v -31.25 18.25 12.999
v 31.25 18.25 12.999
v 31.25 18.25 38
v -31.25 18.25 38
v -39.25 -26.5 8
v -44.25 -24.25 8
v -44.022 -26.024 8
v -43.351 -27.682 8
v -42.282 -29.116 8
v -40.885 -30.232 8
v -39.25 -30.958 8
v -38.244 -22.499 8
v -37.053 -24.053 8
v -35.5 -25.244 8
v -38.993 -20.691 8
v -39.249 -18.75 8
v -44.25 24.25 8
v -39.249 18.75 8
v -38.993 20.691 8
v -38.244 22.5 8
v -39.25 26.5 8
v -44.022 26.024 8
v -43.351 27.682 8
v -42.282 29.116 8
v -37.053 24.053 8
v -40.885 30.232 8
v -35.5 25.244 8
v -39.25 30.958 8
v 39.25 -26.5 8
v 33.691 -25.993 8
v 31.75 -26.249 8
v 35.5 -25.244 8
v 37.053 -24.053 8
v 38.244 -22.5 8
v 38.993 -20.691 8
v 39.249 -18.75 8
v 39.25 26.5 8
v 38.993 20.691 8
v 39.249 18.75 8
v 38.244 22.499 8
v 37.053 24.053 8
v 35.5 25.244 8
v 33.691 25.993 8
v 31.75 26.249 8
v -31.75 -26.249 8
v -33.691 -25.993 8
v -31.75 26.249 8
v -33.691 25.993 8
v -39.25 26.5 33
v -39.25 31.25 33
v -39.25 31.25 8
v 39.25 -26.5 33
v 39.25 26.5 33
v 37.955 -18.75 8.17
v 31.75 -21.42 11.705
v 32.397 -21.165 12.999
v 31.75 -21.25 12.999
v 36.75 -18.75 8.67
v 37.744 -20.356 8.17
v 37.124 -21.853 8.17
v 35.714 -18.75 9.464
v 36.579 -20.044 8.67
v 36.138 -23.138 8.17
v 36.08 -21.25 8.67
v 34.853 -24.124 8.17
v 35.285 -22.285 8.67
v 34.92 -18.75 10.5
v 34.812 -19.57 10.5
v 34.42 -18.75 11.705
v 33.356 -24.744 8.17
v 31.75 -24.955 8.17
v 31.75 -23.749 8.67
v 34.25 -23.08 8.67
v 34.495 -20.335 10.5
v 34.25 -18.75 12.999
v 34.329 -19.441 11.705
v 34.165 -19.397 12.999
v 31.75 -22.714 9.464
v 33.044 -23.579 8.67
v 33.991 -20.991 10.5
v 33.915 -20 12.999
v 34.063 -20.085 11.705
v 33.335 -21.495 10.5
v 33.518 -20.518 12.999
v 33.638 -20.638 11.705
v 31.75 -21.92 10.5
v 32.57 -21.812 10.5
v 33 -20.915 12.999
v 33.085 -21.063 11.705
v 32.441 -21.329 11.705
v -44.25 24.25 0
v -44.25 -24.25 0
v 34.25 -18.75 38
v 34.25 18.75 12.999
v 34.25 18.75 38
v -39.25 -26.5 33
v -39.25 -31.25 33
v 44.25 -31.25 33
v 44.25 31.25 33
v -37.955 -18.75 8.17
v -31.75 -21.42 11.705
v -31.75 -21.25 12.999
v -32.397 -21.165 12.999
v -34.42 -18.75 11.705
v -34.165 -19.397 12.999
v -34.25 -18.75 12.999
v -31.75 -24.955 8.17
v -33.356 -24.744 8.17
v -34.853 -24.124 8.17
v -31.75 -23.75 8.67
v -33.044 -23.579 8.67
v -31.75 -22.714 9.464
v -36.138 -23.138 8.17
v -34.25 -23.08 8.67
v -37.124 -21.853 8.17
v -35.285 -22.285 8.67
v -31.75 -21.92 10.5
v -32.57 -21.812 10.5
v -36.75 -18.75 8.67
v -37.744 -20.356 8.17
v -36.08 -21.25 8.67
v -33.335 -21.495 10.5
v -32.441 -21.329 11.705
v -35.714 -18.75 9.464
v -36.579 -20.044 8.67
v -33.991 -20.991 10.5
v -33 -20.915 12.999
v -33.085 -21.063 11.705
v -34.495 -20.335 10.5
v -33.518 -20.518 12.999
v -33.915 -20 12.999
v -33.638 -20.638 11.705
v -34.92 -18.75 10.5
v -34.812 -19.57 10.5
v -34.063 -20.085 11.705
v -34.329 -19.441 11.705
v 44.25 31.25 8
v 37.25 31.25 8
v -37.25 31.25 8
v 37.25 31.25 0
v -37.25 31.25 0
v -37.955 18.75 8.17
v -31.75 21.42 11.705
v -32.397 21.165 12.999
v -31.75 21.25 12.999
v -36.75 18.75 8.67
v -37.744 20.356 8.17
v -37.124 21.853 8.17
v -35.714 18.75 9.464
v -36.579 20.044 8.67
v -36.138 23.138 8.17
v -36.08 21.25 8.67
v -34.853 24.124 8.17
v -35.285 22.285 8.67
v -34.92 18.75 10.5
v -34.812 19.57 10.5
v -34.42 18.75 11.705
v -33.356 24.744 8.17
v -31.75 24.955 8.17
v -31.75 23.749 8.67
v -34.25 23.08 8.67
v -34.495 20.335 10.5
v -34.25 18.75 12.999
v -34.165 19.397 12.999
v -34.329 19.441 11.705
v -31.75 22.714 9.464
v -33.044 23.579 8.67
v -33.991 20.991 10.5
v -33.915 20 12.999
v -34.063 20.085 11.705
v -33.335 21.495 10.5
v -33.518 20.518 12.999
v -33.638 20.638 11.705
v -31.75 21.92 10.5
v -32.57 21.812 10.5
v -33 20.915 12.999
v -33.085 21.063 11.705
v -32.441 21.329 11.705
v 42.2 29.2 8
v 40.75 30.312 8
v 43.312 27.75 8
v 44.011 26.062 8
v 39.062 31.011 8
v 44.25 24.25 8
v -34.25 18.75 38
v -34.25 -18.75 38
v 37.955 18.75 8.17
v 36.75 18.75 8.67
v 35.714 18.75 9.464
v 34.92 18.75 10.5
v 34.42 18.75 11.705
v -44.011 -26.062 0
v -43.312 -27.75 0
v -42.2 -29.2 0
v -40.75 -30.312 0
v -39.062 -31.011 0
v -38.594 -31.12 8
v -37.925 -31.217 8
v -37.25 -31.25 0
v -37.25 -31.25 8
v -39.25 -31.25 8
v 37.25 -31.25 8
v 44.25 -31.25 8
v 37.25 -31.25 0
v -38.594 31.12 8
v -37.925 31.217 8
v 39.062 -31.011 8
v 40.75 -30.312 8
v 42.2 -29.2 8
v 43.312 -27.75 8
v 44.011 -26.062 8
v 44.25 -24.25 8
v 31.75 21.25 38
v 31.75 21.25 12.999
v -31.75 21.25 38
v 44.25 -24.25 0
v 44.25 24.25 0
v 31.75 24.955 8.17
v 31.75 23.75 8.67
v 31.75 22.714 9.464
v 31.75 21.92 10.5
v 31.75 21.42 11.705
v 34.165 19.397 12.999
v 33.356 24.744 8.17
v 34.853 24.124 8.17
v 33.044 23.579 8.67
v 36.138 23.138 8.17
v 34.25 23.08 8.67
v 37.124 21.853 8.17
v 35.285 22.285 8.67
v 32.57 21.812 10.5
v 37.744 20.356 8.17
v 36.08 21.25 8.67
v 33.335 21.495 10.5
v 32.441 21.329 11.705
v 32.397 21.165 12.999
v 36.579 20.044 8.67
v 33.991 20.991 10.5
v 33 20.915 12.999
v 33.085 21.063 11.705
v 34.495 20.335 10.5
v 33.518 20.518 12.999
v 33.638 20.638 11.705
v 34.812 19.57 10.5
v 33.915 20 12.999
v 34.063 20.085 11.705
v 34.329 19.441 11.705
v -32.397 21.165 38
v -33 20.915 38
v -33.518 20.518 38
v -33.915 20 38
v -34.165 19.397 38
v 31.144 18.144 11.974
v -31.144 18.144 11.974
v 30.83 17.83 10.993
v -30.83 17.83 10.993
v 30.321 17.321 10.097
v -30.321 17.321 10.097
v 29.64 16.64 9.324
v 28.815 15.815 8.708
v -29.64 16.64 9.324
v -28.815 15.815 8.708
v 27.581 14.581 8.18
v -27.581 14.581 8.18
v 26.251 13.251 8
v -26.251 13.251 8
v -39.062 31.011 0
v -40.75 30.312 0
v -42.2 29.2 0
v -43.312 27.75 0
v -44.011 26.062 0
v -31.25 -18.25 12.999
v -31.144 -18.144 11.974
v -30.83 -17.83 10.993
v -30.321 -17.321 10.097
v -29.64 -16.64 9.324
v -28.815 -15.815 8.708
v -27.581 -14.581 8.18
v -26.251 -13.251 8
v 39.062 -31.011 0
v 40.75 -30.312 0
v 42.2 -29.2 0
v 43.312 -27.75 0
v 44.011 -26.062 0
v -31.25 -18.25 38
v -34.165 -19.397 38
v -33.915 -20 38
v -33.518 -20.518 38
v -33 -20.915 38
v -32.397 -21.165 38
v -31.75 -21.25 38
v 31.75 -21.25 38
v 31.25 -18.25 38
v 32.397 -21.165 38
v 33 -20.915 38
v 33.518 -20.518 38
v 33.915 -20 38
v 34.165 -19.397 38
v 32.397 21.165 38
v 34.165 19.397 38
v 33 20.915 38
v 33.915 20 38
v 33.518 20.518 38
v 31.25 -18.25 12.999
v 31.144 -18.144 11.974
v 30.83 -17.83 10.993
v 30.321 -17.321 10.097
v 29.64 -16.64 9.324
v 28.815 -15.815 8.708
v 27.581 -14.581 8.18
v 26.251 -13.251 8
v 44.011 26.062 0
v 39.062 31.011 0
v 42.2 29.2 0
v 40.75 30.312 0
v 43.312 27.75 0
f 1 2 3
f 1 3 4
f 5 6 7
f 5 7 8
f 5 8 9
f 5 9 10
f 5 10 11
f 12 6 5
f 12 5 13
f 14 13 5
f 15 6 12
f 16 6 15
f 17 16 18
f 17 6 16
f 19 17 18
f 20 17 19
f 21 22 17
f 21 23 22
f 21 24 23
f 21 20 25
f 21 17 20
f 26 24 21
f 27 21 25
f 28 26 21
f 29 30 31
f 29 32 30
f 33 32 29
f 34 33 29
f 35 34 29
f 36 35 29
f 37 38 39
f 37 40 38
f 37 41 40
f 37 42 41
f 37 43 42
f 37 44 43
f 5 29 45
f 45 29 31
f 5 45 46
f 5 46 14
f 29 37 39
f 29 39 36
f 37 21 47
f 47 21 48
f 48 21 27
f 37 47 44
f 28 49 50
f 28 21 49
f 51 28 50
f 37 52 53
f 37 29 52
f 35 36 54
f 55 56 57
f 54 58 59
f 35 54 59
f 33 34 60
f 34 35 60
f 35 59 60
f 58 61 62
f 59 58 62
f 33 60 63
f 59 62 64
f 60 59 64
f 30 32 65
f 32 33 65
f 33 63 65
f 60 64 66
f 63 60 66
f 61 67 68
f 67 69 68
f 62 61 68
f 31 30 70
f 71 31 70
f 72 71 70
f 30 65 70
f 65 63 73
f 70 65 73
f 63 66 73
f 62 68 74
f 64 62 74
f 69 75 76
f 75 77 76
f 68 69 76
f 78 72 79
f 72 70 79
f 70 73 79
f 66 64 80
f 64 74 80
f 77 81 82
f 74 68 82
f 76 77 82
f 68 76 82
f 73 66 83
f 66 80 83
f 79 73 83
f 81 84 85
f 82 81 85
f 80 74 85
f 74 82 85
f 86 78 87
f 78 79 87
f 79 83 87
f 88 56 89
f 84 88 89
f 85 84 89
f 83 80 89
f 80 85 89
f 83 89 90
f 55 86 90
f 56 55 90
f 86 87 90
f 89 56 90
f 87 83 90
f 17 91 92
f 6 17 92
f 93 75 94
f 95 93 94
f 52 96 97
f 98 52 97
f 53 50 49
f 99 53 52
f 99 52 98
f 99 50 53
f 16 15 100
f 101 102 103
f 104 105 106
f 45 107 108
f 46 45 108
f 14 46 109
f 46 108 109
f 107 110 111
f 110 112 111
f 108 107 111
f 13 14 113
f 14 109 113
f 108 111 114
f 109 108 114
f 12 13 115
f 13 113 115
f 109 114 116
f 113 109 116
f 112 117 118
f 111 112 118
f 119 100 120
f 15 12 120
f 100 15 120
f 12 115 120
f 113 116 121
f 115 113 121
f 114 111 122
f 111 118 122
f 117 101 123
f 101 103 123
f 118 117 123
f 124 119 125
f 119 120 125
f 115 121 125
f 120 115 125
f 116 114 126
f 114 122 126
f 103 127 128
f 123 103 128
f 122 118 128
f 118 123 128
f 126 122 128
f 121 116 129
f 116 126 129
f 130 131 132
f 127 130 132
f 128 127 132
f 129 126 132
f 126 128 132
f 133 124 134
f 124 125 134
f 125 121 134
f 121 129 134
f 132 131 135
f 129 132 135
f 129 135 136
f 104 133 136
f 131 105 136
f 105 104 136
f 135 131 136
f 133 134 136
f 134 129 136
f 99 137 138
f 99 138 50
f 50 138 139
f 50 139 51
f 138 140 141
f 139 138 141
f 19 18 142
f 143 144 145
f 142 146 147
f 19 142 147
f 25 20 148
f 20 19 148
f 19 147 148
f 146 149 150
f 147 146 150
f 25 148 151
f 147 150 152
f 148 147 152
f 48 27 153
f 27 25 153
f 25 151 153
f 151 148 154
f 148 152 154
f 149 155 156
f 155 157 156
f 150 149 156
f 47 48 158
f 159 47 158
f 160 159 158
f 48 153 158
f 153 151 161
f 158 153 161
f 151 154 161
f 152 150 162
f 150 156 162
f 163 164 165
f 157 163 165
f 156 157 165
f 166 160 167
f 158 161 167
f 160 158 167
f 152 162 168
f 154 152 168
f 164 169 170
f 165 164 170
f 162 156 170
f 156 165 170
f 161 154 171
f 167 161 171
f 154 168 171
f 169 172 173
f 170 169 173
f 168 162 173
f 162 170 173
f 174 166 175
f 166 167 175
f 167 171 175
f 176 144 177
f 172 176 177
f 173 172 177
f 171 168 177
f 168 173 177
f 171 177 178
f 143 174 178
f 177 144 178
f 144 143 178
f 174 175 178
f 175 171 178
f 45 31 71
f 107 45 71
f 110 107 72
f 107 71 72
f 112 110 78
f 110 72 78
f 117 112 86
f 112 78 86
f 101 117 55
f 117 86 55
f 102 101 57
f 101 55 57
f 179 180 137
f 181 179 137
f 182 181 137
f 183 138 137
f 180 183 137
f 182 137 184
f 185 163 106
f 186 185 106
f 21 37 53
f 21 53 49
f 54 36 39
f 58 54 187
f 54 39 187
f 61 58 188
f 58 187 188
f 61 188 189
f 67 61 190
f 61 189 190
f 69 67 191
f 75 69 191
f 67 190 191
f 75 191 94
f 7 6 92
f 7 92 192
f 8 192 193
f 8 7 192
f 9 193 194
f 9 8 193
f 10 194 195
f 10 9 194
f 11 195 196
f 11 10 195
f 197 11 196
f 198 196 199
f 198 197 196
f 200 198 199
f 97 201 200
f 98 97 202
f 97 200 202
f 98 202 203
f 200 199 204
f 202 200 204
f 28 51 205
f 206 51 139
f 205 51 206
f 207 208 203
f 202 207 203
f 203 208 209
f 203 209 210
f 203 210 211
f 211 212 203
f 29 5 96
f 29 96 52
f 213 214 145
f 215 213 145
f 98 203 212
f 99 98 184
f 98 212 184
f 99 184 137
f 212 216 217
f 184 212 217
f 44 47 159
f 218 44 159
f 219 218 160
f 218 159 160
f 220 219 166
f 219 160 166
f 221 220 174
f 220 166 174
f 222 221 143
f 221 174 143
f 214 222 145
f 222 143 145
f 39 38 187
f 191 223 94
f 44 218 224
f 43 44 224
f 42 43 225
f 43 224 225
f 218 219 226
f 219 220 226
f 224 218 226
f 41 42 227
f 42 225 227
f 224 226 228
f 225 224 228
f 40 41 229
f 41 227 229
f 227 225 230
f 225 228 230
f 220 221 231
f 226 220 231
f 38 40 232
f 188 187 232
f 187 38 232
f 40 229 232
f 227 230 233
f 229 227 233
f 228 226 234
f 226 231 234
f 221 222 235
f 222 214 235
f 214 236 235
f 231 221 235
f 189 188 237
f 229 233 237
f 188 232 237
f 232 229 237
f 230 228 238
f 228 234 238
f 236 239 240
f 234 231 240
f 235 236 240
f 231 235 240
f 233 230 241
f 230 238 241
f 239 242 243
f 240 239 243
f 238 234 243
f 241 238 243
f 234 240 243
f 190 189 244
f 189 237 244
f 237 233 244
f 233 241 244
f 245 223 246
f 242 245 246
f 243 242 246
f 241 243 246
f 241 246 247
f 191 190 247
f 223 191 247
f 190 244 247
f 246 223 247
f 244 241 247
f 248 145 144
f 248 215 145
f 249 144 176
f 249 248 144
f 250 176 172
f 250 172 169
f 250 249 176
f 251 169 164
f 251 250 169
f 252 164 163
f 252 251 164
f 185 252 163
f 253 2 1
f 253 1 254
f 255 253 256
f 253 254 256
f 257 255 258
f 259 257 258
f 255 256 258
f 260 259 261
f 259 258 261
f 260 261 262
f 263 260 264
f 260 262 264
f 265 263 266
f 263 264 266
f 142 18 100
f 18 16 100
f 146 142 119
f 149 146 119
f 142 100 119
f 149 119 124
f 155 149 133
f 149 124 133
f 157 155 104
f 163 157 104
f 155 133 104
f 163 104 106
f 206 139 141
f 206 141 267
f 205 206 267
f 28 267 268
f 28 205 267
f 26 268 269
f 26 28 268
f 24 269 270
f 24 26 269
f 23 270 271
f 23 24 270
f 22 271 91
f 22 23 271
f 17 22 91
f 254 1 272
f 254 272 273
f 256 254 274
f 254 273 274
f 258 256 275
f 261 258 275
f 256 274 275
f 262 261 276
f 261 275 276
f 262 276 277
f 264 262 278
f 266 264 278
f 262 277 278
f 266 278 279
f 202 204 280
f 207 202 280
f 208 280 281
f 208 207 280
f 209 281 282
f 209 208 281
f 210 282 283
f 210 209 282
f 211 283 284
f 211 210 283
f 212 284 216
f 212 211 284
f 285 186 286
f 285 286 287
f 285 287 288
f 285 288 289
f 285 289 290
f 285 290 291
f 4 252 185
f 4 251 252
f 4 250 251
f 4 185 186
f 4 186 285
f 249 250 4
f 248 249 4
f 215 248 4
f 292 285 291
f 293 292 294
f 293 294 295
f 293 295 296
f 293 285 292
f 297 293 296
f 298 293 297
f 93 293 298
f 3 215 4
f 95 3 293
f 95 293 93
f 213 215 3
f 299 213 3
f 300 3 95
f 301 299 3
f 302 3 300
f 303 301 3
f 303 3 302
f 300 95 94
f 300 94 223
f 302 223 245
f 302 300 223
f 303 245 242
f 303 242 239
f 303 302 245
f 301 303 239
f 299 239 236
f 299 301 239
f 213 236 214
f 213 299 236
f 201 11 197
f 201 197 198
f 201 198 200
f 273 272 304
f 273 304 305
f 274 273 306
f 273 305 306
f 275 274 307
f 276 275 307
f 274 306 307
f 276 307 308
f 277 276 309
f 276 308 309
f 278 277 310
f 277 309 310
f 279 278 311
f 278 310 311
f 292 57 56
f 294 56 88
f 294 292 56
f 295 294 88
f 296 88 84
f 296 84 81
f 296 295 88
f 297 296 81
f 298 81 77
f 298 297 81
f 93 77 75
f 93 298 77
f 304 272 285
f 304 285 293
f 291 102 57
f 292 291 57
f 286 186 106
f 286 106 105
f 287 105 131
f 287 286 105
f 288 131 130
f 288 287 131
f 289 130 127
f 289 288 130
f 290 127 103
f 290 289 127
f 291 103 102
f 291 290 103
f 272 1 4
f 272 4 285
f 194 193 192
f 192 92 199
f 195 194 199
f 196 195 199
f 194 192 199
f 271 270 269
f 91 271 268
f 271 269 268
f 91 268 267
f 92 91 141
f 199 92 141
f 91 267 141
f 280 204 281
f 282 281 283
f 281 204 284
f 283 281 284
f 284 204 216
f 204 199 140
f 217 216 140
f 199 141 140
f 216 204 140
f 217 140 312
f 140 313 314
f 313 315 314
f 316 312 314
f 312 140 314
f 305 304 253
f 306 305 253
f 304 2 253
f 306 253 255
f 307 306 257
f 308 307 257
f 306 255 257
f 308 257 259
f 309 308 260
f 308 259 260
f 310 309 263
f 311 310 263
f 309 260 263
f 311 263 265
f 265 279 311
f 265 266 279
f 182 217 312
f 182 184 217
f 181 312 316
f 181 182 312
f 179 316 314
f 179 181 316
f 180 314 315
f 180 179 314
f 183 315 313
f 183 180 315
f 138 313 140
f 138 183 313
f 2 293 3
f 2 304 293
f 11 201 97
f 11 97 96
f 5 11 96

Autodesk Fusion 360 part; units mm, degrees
sketch "Sketch20" plane through (0, 0, 0) normal (0, 0, 1) x (1, 0, 0)
  line L0 (-44.25, -31.25) -> (44.25, -31.25)
  line L1 (44.25, -31.25) -> (44.25, 31.25)
  line L2 (44.25, 31.25) -> (-44.25, 31.25)
  line L3 (-44.25, 31.25) -> (-44.25, -31.25)
extrude "Extrude16" add sketch "Sketch20" along normal blind 8
fillet "Fillet3" radius 7 4 edges at (-44.25, 31.25, 4) (44.25, 31.25, 4) (44.25, -31.25, 4) (-44.25, -31.25, 4)
ref_plane "WorkPlane17" through (0, 0, 8) normal (0, 0, 1) x (1, 0, 0)
sketch "Sketch21" plane through (0, 0, 8) normal (0, 0, 1) x (1, 0, 0)
  line L0 (-34.25, -21.25) -> (34.25, -21.25)
  line L1 (34.25, -21.25) -> (34.25, 21.25)
  line L2 (34.25, 21.25) -> (-34.25, 21.25)
  line L3 (-34.25, 21.25) -> (-34.25, -21.25)
  line L4 (-31.25, -18.25) -> (31.25, -18.25)
  line L5 (31.25, -18.25) -> (31.25, 18.25)
  line L6 (31.25, 18.25) -> (-31.25, 18.25)
  line L7 (-31.25, 18.25) -> (-31.25, -18.25)
extrude "Extrude17" add sketch "Sketch21" along normal blind 30
fillet "Fillet4" radius 2.5 4 edges at (-34.25, 21.25, 23) (34.25, 21.25, 23) (34.25, -21.25, 23) (-34.25, -21.25, 23)
sketch "Sketch22" plane through (0, 0, 8) normal (0, 0, 1) x (1, 0, 0)
  line L0 (-44.25, -31.25) -> (44.25, -31.25)
  line L1 (44.25, -31.25) -> (44.25, 31.25)
  line L2 (44.25, 31.25) -> (-44.25, 31.25)
  line L3 (-44.25, 31.25) -> (-44.25, -31.25)
  line L4 (-39.25, -26.5) -> (39.25, -26.5)
  line L5 (39.25, -26.5) -> (39.25, 26.5)
  line L6 (39.25, 26.5) -> (-39.25, 26.5)
  line L7 (-39.25, 26.5) -> (-39.25, -26.5)
extrude "Extrude18" add sketch "Sketch22" along normal blind 25
sketch "Sketch23" plane through (0, 0, 8) normal (0, 0, 1) x (1, 0, 0)
  line L0 (-44.25, -31.25) -> (-39.25, -31.25)
  line L1 (-39.25, -31.25) -> (-39.25, 31.25)
  line L2 (-39.25, 31.25) -> (-44.25, 31.25)
  line L3 (-44.25, 31.25) -> (-44.25, -31.25)
extrude "Extrude19" cut sketch "Sketch23" along normal blind 25
fillet "Fillet5" radius 5 68 edges at (-33.5178, -20.5178, 8) (0, -21.25, 8) (33.5178, -20.5178, 8) (34.25, 0, 8) (33.5178, 20.5178, 8) (0, 21.25, 8) (-33.5178, 20.5178, 8) (-34.25, 0, 8) (0, -21.25, 8) (-33.5178, -20.5178, 8) (-34.25, 0, 8) (-33.5178, 20.5178, 8) (0, 21.25, 8) (33.5178, 20.5178, 8) (34.25, 0, 8) (33.5178, -20.5178, 8) (33.5178, -20.5178, 8) (34.25, 0, 8) (33.5178, 20.5178, 8) (0, 21.25, 8) (-33.5178, 20.5178, 8) (-34.25, 0, 8) (-33.5178, -20.5178, 8) (0, -21.25, 8) (33.5178, 20.5178, 8) (0, 21.25, 8) (-33.5178, 20.5178, 8) (-34.25, 0, 8) (-33.5178, -20.5178, 8) (0, -21.25, 8) (33.5178, -20.5178, 8) (34.25, 0, 8) (0, 21.25, 8) (33.5178, 20.5178, 8) (34.25, 0, 8) (33.5178, -20.5178, 8) (0, -21.25, 8) (-33.5178, -20.5178, 8) (-34.25, 0, 8) (-33.5178, 20.5178, 8) (-33.5178, 20.5178, 8) (-34.25, 0, 8) (-33.5178, -20.5178, 8) (0, -21.25, 8) (33.5178, -20.5178, 8) (34.25, 0, 8) (33.5178, 20.5178, 8) (0, 21.25, 8) (-34.25, 0, 8) (-33.5178, 20.5178, 8) (0, 21.25, 8) (33.5178, 20.5178, 8) (34.25, 0, 8) (33.5178, -20.5178, 8) (0, -21.25, 8) (-33.5178, -20.5178, 8) (0, -18.25, 8) (31.25, 0, 8) (0, 18.25, 8) (-31.25, 0, 8) (34.25, 0, 8) (33.5178, -20.5178, 8) (0, -21.25, 8) (-33.5178, -20.5178, 8) (-34.25, 0, 8) (-33.5178, 20.5178, 8) (0, 21.25, 8) (33.5178, 20.5178, 8)
